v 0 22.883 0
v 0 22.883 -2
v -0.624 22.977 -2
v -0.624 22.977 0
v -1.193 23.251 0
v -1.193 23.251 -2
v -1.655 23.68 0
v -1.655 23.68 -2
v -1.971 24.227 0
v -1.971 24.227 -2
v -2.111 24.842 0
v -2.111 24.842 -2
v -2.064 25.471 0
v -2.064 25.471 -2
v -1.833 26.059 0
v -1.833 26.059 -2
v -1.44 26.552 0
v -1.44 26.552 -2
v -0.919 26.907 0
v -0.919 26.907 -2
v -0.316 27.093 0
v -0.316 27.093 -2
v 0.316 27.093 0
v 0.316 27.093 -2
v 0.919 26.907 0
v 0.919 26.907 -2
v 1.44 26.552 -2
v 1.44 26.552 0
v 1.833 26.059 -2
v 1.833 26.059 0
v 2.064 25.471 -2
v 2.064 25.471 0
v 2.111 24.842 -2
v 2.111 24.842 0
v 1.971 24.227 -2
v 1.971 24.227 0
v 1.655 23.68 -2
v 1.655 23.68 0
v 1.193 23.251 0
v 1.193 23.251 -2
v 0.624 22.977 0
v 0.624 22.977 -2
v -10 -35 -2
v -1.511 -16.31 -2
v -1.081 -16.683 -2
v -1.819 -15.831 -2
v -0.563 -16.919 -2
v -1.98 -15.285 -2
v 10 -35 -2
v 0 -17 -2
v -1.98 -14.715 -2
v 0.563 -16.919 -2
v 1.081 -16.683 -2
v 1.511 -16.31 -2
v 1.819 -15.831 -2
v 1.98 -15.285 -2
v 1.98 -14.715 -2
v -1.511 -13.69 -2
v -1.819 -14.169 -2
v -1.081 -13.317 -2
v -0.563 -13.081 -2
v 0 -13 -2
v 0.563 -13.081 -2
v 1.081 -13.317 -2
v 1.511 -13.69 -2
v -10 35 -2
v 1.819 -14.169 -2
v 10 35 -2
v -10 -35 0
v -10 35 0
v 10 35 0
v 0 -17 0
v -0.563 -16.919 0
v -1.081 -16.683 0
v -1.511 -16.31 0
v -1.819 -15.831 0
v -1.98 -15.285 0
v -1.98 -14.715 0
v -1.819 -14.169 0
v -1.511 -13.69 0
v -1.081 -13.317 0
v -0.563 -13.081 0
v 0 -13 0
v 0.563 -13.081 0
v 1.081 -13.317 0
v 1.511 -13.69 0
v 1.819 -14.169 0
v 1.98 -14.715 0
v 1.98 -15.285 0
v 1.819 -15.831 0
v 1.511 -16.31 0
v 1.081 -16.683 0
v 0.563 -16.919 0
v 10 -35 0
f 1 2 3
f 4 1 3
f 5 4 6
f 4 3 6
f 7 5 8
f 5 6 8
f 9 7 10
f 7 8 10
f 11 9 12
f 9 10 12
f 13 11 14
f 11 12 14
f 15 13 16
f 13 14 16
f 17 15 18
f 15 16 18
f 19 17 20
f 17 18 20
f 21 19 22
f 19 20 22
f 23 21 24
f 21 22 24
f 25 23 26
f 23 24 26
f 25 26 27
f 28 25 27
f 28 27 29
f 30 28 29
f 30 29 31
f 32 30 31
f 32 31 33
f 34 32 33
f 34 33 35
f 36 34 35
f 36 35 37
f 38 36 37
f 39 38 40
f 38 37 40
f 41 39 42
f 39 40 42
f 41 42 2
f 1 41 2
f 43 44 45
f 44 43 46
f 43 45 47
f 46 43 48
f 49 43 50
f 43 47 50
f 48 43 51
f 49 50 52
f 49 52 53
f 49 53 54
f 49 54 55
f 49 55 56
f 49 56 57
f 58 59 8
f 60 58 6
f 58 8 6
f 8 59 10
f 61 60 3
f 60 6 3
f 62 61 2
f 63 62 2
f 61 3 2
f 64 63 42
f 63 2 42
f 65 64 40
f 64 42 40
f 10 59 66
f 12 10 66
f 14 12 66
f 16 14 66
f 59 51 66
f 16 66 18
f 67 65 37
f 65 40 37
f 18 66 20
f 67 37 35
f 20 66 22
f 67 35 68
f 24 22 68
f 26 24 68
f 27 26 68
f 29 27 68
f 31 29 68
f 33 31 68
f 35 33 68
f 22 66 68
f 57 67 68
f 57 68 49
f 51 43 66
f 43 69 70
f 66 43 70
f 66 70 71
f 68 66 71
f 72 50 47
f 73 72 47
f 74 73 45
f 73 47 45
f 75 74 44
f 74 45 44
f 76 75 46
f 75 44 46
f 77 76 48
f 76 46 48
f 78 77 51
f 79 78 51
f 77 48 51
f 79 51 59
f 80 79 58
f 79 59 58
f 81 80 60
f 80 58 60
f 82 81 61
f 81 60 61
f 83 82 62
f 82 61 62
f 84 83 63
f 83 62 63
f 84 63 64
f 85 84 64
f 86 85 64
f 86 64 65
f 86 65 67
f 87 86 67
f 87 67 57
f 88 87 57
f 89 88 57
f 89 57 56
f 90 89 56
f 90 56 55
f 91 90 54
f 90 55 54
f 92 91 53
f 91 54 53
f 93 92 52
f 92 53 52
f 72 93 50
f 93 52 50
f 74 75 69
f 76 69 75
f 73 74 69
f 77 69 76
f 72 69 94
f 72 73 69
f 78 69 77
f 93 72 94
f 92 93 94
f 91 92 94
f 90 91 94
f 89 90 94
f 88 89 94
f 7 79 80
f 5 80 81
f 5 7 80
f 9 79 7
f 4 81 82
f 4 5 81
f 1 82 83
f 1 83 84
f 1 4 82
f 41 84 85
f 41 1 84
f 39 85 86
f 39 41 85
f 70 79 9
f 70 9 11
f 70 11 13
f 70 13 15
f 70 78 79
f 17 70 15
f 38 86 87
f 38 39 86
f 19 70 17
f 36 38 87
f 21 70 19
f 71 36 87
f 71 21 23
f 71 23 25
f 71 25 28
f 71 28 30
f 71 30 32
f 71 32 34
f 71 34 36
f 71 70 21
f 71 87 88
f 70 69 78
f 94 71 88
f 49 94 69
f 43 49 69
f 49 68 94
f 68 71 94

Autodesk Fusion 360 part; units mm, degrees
sketch "Sketch1" plane through (0, 0, 0) normal (0, 0, 1) x (1, 0, 0)
  line L0 (10, -35) -> (-10, -35)
  line L1 (-10, -35) -> (-10, 35)
  line L2 (-10, 35) -> (10, 35)
  line L3 (10, 35) -> (10, -35)
  line L4 (10, -35) -> (-10, 35) construction
  line L5 (-10, -35) -> (10, 35) construction
  line L6 (10, 35) -> (0, 35)
  line L7 (0, 35) -> (0, 25)
  line L8 (0, 25) -> (10, 25)
  line L9 (10, 25) -> (10, 35)
  line L10 (0, 25) -> (0, -15)
  circle A0 centre (0, -15) radius 2
  circle A1 centre (0, 25) radius 2.5
  dimension "d1" = 20
  dimension "d2" = 70
  dimension "d3" = 10
  dimension "d4" = 10
  dimension "d5" = 40
  dimension "d25" = 4
  dimension "d26" = 5
extrude "Extrude1" add sketch "Sketch1" against normal blind 2 contours A0 | L0 L1 L2 L3 L7 L8 A1 | L2 L3 L6 L7 L8 L9 A1 | L8 L10 A1 | L7 L8 A1 | L7 L10 A1
hole "Hole1" at (0, 25, 0) direction (0, 0, -1) diameter 4.234 depth 3 tip angle 118
sketch "Sketch2" plane through (0, 0, 0) normal (0, 0, 1) x (1, 0, 0)
  line L0 (2.2126, 24.4763) -> (7.2126, 24.4763) construction
  line L1 (7.2126, 24.4763) -> (7.2126, 28.4763) construction
  line L2 (7.2126, 28.4763) -> (2.2126, 28.4763) construction
  line L3 (2.2126, 28.4763) -> (2.2126, 24.4763) construction
  dimension "d18" = 2
  dimension "d19" = 0
hole "Hole3" at (0, -15, 0) direction (0, 0, -1) diameter 4 depth 20 tip angle 118
equation "d19 = 'M5'"
